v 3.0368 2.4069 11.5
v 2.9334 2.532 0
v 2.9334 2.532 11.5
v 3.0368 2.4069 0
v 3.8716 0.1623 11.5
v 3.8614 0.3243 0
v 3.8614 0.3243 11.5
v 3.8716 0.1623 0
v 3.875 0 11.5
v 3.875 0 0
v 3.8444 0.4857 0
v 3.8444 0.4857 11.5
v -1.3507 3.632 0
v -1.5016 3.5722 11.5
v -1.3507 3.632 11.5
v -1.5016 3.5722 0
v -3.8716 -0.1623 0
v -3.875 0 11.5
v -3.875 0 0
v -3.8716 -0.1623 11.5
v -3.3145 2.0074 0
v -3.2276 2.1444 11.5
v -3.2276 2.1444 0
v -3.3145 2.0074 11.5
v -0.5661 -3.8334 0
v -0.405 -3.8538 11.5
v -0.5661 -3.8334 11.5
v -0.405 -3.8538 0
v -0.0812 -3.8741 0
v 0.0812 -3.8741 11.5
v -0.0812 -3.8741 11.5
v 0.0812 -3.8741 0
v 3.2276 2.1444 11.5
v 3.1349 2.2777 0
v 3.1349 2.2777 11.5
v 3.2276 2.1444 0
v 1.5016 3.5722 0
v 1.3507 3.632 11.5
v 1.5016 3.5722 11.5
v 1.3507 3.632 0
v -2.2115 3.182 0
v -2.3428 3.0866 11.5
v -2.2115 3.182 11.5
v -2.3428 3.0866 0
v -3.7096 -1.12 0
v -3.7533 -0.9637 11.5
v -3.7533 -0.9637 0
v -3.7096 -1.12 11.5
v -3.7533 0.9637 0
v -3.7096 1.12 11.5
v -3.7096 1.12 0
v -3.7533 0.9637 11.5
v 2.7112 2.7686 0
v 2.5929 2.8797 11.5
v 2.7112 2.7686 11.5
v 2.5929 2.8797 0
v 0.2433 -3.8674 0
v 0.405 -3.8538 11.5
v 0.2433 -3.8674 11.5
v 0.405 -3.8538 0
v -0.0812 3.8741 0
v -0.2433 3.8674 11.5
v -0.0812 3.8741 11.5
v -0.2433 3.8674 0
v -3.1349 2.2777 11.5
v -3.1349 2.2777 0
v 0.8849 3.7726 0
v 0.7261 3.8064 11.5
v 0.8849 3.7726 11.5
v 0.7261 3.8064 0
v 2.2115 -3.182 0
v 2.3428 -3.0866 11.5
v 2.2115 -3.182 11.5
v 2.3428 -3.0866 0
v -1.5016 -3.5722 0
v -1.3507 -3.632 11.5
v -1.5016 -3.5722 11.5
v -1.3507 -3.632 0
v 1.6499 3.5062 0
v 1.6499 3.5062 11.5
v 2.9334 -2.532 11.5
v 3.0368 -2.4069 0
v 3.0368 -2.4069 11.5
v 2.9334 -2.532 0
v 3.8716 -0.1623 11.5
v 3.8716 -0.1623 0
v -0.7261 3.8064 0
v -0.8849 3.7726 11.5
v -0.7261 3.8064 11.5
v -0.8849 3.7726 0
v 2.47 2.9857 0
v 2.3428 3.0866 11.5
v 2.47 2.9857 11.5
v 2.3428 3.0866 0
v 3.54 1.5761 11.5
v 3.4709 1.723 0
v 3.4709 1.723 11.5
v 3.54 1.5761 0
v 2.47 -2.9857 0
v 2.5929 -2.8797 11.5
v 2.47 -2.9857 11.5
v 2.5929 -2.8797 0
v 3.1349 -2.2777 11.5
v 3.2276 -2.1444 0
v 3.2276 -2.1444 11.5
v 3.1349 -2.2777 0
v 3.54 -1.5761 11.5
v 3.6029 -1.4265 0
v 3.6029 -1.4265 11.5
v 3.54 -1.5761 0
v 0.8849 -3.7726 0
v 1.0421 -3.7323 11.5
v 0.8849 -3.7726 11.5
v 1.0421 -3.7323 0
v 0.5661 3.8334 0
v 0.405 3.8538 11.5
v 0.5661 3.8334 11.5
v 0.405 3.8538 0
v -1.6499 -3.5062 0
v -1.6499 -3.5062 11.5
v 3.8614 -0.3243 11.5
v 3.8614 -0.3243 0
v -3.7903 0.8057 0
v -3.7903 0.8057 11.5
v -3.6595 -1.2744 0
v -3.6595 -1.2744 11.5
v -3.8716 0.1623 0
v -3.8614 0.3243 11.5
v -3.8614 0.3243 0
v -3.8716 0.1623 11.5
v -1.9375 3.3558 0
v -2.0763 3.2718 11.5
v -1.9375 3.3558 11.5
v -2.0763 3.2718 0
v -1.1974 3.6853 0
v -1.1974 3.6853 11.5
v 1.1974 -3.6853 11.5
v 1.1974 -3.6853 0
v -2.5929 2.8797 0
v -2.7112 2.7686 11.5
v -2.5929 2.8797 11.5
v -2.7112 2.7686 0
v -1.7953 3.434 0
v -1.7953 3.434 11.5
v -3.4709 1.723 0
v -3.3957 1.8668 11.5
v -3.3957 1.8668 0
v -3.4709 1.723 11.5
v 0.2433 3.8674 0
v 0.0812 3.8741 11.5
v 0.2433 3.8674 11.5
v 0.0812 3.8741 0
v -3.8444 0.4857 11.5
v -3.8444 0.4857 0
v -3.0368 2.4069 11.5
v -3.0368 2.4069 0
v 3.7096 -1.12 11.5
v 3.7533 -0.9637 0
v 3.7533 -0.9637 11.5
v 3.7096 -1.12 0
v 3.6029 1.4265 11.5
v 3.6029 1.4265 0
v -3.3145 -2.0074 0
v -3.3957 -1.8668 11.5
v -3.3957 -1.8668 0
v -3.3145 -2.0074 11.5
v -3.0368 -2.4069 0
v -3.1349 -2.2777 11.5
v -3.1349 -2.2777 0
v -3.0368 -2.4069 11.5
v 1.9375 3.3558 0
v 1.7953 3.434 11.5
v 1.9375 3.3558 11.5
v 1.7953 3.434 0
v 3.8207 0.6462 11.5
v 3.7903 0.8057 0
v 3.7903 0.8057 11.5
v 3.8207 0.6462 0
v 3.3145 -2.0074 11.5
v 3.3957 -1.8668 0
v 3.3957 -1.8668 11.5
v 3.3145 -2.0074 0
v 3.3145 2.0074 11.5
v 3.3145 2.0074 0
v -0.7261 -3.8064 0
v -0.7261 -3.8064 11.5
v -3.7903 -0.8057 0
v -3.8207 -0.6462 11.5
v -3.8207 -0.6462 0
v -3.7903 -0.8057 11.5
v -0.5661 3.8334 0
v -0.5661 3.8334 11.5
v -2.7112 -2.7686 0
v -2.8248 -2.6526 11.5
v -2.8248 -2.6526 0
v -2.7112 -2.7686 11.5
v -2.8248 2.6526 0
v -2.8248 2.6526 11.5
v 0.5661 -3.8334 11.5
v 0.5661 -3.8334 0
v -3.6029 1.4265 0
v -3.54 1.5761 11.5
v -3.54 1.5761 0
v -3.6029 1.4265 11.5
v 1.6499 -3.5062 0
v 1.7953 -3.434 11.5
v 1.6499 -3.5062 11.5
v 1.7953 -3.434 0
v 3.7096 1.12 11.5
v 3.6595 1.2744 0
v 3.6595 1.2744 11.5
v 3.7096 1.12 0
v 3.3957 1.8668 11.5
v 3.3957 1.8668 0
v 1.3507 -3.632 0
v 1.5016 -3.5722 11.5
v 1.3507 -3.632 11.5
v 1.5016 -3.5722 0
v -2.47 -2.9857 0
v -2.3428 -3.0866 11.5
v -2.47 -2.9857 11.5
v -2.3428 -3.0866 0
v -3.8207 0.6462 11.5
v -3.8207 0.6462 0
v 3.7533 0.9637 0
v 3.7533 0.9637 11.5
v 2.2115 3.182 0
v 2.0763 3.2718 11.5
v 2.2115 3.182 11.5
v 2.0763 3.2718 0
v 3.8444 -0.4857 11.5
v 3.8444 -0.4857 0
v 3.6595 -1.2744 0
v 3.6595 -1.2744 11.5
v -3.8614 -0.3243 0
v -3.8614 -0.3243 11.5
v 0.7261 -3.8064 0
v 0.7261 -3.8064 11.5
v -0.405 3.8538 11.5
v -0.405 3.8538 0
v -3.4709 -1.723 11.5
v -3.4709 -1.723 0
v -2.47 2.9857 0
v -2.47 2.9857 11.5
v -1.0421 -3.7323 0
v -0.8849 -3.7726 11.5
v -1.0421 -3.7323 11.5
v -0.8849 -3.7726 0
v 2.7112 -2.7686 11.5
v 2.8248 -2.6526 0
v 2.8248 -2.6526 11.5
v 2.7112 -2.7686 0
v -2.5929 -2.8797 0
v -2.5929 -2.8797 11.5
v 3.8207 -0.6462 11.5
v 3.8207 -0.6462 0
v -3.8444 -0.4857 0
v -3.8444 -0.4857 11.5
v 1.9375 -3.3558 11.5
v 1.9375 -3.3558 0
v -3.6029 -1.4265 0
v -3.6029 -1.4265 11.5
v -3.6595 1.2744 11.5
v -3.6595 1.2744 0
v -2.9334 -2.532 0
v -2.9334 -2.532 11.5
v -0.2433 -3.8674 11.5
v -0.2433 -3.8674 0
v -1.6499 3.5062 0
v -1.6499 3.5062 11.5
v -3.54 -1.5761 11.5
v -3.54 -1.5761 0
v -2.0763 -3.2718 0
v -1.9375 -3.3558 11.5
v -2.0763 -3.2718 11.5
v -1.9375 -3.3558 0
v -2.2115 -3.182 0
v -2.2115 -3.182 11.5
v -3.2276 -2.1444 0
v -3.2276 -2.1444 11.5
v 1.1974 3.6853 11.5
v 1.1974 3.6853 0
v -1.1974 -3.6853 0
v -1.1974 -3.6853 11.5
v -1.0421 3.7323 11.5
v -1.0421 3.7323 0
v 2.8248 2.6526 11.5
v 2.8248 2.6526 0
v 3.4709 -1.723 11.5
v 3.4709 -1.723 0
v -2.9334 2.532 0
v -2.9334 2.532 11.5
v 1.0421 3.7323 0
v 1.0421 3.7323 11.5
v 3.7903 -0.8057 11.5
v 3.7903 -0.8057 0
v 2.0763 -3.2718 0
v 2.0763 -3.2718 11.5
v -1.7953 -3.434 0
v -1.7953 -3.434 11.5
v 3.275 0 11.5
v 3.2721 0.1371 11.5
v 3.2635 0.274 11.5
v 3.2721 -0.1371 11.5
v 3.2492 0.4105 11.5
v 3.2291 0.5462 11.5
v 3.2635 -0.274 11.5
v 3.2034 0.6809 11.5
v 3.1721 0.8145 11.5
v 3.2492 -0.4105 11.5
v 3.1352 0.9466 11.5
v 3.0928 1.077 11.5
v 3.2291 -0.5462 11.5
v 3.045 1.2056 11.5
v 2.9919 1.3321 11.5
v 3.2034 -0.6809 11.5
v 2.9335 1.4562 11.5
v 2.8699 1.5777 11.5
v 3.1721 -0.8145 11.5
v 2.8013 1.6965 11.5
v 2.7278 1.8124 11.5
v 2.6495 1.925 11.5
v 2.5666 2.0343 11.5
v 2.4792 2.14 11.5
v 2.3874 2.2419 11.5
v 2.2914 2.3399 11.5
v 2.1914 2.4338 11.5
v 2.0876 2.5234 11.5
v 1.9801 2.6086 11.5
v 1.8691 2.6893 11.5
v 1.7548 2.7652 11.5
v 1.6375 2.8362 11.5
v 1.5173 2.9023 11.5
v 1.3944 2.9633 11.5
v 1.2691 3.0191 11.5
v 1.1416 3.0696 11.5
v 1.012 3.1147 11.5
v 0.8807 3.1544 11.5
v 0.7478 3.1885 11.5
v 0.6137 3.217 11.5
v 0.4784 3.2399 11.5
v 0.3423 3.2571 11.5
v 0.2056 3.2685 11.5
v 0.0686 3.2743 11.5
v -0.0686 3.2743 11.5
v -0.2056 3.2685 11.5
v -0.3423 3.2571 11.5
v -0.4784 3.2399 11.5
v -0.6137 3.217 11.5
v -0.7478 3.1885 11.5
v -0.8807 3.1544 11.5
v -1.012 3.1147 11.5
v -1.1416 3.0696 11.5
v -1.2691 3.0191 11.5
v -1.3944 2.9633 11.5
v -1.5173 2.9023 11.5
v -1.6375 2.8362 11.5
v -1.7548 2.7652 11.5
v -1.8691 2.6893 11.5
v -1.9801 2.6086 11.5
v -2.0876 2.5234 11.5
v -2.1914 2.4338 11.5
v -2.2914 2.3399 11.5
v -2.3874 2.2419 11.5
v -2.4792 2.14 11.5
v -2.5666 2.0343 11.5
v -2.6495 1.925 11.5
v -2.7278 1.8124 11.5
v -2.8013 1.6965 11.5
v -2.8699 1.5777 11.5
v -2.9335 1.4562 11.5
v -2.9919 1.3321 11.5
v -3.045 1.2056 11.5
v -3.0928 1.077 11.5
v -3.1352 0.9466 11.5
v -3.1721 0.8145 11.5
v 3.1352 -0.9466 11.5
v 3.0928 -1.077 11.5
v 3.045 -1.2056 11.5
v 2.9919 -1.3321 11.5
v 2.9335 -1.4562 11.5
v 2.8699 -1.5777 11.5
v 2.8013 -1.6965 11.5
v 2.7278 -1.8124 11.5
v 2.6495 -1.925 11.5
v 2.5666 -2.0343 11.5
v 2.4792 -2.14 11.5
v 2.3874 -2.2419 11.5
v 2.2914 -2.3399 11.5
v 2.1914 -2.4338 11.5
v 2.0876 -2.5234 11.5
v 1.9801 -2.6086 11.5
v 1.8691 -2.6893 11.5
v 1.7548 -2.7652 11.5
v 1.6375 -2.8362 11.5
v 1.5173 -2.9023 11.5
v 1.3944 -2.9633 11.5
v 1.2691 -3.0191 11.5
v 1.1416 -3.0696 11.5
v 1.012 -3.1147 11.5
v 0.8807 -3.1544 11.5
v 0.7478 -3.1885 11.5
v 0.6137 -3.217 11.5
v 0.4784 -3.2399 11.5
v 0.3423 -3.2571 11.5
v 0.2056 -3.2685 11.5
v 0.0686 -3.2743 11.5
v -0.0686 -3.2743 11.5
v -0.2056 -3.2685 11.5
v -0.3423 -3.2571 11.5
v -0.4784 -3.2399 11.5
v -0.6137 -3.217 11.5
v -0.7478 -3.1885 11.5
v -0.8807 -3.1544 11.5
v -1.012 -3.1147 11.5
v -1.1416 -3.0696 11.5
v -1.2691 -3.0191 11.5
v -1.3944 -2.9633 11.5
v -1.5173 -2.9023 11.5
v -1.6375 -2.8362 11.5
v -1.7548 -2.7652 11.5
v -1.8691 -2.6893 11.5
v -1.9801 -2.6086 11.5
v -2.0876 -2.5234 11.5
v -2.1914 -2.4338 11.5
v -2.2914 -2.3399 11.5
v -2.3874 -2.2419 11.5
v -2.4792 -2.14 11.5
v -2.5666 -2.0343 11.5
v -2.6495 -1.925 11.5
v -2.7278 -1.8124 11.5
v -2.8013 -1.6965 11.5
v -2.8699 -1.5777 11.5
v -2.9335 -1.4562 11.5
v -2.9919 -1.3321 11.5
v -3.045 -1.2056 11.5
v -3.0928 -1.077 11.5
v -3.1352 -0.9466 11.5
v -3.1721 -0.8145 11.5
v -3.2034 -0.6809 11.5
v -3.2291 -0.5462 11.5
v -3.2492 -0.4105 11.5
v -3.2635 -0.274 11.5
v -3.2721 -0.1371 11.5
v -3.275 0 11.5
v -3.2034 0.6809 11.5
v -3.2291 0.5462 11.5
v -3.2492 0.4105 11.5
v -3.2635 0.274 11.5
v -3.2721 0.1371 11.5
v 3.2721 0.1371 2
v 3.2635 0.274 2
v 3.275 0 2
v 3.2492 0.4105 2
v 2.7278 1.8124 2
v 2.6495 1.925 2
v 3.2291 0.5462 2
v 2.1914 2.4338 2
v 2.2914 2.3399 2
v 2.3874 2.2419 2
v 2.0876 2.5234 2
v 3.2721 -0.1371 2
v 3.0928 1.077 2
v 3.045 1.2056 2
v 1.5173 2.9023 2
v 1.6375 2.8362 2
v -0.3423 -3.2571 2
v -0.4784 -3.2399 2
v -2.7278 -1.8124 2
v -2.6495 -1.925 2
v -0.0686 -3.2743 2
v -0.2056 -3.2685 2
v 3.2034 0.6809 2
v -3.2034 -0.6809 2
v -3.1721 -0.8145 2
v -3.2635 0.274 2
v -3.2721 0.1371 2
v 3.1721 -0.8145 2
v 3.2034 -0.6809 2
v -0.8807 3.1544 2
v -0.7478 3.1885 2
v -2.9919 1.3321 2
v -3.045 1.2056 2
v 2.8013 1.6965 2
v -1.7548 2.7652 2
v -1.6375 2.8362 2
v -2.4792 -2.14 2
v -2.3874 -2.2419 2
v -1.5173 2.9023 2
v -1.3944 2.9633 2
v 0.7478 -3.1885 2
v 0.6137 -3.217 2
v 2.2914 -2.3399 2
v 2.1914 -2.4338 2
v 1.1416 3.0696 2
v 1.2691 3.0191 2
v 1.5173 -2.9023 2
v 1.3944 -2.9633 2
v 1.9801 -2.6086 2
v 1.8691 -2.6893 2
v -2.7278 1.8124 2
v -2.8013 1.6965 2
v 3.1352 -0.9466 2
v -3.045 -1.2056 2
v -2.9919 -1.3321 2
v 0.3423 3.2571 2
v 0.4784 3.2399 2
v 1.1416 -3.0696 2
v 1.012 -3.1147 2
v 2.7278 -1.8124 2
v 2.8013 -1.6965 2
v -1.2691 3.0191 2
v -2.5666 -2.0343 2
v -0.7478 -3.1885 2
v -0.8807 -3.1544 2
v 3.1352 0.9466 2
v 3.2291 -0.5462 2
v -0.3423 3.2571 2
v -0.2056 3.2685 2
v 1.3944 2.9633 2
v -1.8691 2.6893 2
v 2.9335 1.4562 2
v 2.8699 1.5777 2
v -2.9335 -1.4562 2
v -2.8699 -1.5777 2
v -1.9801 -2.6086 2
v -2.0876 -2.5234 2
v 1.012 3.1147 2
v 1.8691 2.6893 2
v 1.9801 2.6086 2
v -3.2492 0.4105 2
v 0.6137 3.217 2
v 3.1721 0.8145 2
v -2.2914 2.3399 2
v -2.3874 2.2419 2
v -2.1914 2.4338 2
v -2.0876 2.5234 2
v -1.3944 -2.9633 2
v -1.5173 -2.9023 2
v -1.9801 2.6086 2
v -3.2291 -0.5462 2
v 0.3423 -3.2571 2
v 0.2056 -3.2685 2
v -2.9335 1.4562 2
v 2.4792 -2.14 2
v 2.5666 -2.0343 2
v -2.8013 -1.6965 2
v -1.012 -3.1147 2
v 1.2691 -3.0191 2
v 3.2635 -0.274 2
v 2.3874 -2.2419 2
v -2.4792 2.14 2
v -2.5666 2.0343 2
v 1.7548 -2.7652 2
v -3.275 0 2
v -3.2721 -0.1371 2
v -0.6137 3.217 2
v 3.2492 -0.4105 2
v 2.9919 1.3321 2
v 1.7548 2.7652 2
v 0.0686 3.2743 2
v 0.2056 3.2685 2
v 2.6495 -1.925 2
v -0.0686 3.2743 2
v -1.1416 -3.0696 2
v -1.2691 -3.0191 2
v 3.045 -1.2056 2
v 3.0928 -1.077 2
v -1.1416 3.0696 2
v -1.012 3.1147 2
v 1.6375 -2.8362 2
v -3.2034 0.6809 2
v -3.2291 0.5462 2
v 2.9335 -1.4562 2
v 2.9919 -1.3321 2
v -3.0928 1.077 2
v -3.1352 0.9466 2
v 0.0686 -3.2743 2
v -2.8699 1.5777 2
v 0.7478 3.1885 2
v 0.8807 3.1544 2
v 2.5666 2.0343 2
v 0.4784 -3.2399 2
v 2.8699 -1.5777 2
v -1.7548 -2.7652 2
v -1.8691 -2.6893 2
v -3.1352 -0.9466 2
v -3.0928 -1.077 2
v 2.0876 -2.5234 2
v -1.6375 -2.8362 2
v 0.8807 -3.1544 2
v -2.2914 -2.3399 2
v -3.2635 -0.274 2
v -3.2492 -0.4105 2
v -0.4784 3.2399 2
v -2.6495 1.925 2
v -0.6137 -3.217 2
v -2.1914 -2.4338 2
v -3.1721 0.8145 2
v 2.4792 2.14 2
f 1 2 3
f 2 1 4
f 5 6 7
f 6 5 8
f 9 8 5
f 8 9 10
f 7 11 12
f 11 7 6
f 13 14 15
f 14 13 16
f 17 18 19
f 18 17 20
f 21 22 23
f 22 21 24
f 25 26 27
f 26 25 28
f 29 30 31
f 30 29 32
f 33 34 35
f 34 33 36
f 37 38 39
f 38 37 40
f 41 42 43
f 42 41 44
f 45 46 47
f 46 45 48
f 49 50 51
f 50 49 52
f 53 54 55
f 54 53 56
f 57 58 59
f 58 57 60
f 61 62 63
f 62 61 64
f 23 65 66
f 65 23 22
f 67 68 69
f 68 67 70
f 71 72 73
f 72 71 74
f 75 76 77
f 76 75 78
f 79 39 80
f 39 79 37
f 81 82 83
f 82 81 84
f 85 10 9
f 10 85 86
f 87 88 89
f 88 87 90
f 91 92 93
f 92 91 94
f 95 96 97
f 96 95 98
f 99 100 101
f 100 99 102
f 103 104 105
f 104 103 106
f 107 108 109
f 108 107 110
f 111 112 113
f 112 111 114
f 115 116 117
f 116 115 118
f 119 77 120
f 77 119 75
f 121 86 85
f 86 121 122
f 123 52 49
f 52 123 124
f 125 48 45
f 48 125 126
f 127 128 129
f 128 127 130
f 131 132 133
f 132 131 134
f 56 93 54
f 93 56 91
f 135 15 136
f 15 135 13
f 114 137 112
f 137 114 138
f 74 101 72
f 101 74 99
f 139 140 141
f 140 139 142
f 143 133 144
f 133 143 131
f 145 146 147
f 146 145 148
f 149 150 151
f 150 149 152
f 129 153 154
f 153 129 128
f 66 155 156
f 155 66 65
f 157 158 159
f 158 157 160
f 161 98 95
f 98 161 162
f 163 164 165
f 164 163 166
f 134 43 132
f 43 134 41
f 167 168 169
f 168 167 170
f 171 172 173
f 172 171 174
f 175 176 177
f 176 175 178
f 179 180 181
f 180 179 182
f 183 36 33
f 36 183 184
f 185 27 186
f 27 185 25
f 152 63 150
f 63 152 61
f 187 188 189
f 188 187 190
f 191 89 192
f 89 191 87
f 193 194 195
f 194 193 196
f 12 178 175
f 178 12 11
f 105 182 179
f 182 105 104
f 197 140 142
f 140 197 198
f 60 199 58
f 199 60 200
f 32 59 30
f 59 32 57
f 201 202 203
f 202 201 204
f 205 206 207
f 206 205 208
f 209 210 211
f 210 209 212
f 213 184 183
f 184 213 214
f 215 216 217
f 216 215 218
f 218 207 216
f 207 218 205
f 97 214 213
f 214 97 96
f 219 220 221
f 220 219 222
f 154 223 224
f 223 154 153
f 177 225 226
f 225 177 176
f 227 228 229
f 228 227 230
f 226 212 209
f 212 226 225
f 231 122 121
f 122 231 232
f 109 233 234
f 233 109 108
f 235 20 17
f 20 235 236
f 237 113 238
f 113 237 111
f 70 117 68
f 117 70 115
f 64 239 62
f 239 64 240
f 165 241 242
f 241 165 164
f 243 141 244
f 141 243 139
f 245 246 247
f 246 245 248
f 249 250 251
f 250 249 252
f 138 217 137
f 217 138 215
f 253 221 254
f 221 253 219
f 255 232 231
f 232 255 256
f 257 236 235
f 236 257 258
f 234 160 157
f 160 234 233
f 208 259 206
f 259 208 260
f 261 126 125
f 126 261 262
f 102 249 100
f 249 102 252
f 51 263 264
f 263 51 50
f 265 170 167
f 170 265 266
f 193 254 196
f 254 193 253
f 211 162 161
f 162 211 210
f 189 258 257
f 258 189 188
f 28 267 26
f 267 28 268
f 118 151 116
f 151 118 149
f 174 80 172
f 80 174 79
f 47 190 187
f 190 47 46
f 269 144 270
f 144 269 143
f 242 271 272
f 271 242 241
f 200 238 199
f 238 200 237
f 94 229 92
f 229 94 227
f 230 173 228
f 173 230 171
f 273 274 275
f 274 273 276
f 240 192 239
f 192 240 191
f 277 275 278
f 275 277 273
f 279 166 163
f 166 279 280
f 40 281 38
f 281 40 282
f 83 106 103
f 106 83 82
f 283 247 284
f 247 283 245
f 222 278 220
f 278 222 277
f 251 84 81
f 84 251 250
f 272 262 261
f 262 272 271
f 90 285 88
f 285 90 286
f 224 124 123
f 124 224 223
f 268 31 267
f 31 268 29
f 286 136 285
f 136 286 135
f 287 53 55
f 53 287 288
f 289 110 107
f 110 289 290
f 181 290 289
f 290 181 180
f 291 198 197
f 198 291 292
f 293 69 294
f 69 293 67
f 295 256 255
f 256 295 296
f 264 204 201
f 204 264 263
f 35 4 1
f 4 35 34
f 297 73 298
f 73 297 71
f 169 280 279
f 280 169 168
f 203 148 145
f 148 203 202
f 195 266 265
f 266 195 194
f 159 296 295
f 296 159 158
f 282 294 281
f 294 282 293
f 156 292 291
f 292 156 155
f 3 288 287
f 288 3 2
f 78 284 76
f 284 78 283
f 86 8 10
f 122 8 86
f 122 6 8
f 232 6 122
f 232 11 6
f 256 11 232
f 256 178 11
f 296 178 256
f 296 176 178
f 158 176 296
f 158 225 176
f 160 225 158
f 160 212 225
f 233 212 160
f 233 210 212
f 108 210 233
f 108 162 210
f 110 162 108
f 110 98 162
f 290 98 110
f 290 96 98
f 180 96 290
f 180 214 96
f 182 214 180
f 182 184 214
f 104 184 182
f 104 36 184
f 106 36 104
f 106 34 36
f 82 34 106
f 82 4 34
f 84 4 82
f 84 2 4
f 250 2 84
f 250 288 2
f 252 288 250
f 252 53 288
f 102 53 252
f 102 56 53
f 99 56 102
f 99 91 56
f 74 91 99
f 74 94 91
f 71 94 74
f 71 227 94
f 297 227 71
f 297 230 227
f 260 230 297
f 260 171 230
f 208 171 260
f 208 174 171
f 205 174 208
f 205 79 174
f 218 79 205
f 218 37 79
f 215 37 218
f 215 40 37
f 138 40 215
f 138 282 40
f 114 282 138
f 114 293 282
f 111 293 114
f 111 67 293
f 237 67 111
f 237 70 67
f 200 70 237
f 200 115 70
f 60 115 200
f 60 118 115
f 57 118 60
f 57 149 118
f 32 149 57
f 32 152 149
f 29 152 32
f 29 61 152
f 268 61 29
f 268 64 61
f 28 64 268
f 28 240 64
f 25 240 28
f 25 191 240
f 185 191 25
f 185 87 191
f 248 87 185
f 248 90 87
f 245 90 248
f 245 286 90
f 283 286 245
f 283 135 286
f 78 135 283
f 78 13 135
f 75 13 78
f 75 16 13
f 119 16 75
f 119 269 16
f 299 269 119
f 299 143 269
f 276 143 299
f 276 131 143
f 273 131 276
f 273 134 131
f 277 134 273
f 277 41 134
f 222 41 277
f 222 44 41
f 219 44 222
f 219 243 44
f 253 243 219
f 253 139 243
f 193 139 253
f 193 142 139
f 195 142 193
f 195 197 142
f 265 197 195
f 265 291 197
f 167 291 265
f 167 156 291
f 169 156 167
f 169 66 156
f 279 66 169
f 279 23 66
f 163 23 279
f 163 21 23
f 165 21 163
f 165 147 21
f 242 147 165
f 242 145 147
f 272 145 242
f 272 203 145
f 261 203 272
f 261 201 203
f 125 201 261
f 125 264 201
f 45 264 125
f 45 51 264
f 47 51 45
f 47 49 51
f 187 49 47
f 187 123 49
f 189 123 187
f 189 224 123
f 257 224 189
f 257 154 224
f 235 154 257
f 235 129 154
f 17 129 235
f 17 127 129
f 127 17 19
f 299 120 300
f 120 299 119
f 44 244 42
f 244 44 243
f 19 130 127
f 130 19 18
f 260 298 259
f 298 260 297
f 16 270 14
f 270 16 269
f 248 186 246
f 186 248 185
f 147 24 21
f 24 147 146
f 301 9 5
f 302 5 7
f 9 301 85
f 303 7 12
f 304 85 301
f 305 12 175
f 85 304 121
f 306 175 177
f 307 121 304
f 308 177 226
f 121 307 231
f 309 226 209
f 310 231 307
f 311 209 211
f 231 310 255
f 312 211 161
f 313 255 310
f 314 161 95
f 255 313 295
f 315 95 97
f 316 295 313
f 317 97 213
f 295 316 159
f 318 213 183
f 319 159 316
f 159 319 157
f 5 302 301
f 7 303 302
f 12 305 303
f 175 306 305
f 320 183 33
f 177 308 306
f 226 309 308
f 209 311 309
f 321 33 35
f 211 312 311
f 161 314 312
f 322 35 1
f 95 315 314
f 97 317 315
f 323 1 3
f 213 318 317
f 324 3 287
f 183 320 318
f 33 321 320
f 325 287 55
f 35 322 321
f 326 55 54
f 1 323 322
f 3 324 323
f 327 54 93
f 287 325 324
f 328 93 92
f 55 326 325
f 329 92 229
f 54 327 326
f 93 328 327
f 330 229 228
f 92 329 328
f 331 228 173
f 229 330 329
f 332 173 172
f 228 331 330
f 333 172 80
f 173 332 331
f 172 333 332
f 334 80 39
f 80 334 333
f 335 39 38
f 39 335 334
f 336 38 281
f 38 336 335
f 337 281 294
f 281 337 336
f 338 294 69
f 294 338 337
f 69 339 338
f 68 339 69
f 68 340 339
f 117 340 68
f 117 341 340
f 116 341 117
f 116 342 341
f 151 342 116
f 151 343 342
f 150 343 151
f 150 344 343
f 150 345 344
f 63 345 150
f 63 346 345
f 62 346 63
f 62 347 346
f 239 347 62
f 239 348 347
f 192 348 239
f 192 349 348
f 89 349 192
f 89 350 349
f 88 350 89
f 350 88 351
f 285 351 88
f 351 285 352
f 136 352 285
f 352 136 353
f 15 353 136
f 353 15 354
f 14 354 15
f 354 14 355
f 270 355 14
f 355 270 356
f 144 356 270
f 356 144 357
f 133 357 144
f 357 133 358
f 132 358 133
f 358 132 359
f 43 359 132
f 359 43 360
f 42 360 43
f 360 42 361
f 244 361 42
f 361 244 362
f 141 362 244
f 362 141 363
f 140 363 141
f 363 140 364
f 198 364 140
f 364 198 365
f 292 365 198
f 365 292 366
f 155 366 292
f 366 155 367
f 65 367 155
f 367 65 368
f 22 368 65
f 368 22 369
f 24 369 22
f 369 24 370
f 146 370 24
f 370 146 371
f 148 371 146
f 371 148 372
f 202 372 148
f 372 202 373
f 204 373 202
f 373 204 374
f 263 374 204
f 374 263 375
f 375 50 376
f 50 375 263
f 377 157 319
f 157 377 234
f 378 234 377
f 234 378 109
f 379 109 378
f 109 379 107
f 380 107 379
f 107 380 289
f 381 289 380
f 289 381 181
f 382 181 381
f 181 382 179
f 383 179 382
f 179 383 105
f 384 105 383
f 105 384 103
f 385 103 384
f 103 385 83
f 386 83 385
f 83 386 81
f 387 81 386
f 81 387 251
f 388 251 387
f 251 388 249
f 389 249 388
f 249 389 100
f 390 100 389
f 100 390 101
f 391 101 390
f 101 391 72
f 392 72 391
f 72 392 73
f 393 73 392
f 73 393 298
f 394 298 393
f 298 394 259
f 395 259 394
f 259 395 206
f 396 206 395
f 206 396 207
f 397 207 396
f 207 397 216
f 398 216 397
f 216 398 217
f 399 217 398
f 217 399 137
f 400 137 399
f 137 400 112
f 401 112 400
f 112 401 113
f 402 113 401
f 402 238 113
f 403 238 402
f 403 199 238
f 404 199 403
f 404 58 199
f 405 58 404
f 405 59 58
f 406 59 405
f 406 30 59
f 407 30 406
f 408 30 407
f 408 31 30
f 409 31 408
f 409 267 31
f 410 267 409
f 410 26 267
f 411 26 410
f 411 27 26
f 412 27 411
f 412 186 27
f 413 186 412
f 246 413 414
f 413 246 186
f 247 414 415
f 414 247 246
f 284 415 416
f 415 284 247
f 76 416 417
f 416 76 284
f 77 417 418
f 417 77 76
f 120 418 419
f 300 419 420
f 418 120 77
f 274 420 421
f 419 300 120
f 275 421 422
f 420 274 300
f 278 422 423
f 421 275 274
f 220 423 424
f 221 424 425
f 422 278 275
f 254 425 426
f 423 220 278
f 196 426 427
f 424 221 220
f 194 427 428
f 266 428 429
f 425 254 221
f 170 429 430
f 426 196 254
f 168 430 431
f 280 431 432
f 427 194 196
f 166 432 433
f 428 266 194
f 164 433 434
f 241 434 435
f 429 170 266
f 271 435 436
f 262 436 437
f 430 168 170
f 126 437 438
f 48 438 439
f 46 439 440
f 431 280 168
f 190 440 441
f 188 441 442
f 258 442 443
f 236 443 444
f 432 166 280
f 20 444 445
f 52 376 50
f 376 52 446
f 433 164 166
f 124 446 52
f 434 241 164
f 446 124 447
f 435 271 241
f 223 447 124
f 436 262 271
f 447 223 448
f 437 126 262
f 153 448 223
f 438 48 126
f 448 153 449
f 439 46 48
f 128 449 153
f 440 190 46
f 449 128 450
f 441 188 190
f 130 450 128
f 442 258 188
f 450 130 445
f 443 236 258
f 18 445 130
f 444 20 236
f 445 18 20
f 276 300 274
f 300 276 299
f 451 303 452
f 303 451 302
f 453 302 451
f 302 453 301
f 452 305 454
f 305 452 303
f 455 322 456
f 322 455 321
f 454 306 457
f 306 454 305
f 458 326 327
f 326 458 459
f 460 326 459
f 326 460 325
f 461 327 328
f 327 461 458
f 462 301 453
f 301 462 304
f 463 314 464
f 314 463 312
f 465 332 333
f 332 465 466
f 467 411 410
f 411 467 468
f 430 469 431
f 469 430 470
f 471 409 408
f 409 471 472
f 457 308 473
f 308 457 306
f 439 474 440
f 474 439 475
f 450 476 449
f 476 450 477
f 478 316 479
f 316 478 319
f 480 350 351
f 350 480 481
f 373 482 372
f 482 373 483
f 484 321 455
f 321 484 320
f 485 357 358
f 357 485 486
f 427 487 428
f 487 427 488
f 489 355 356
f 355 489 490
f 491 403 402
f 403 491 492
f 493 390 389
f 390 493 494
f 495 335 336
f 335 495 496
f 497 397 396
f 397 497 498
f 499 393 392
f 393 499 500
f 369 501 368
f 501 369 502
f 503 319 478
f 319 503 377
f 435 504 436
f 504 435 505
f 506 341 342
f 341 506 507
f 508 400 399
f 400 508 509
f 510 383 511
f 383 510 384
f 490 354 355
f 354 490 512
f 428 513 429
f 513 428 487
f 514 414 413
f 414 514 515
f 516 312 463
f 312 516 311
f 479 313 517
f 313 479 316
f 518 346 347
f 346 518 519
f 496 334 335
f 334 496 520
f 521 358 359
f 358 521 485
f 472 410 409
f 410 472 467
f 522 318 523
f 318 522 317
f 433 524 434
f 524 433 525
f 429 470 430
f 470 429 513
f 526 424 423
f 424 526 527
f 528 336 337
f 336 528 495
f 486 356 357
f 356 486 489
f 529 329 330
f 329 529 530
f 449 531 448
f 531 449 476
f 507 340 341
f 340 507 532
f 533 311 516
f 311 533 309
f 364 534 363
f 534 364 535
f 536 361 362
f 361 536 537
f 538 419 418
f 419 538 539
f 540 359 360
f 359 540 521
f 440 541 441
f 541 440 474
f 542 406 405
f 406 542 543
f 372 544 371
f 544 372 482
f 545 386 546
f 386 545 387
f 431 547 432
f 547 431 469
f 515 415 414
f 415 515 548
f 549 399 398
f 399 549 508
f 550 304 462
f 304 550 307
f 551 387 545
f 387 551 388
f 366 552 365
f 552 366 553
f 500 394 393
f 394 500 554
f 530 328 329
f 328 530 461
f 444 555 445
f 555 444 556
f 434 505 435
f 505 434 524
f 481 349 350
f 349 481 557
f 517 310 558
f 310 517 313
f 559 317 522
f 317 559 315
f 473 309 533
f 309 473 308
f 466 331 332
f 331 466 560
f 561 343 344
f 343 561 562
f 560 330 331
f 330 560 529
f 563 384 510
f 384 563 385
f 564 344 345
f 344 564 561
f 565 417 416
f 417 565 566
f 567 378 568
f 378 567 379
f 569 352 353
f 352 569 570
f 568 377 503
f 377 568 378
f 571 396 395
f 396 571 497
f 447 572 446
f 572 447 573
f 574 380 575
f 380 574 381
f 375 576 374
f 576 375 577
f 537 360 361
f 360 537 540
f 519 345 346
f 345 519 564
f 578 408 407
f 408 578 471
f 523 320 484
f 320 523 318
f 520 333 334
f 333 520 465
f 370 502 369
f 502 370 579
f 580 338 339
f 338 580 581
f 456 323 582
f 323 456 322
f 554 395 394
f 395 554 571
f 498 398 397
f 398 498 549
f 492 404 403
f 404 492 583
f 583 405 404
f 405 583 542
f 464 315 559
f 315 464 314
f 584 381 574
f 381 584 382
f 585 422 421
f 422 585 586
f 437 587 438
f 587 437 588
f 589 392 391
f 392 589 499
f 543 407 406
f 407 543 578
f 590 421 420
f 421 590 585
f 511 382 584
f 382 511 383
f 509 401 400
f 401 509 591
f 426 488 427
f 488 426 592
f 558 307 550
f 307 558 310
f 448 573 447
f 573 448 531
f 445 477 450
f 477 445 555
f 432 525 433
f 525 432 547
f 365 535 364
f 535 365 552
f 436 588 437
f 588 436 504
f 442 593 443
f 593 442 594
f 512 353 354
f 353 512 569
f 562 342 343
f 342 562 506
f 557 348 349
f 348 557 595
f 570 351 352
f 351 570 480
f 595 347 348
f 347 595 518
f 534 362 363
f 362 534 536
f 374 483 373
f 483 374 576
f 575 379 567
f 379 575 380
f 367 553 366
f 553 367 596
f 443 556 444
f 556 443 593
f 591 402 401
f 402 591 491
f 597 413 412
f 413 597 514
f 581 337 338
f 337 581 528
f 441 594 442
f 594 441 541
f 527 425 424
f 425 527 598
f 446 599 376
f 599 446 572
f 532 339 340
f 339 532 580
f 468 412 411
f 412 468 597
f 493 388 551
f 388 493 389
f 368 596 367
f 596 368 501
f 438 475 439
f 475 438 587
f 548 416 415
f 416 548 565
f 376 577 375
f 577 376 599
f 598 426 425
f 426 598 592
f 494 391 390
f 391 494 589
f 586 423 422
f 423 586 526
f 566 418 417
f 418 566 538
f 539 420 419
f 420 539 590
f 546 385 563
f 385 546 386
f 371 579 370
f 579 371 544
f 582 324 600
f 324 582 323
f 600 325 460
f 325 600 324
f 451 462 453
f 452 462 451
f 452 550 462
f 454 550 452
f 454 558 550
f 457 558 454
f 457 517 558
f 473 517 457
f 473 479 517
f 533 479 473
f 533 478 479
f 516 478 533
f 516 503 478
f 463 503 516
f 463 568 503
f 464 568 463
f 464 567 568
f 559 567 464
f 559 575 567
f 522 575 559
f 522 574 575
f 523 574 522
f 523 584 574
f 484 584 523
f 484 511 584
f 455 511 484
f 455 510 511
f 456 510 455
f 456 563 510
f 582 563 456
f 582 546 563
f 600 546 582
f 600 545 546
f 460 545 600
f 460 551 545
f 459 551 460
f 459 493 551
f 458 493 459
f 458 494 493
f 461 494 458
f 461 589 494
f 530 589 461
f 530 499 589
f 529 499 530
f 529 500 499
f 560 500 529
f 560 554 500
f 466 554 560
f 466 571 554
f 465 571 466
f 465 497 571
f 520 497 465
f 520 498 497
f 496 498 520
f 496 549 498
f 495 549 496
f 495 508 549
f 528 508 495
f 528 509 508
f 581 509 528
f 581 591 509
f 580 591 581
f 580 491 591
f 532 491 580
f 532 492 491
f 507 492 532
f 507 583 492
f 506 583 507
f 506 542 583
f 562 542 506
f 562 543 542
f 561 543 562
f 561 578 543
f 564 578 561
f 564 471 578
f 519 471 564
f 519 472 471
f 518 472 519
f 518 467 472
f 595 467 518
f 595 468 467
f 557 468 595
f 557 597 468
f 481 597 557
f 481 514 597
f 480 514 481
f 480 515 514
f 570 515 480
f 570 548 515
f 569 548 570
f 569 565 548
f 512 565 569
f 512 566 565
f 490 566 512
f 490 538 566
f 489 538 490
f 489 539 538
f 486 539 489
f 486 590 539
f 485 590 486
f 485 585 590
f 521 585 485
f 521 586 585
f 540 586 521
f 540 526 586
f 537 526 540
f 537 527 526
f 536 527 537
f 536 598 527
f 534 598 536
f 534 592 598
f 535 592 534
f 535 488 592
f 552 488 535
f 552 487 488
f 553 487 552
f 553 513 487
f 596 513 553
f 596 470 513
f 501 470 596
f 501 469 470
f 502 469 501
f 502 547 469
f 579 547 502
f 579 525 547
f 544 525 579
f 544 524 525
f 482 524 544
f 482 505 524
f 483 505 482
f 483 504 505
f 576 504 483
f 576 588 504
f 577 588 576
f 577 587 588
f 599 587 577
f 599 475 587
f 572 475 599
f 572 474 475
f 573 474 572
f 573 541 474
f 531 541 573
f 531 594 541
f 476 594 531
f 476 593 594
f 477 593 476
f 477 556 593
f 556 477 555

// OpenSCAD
$fn = 150;

difference() {
	cylinder(d = 7.75, h = 11.5);
	translate(v = [0, 0, 2]) {
		cylinder(d = 6.55, h = 11.5);
	}
}
